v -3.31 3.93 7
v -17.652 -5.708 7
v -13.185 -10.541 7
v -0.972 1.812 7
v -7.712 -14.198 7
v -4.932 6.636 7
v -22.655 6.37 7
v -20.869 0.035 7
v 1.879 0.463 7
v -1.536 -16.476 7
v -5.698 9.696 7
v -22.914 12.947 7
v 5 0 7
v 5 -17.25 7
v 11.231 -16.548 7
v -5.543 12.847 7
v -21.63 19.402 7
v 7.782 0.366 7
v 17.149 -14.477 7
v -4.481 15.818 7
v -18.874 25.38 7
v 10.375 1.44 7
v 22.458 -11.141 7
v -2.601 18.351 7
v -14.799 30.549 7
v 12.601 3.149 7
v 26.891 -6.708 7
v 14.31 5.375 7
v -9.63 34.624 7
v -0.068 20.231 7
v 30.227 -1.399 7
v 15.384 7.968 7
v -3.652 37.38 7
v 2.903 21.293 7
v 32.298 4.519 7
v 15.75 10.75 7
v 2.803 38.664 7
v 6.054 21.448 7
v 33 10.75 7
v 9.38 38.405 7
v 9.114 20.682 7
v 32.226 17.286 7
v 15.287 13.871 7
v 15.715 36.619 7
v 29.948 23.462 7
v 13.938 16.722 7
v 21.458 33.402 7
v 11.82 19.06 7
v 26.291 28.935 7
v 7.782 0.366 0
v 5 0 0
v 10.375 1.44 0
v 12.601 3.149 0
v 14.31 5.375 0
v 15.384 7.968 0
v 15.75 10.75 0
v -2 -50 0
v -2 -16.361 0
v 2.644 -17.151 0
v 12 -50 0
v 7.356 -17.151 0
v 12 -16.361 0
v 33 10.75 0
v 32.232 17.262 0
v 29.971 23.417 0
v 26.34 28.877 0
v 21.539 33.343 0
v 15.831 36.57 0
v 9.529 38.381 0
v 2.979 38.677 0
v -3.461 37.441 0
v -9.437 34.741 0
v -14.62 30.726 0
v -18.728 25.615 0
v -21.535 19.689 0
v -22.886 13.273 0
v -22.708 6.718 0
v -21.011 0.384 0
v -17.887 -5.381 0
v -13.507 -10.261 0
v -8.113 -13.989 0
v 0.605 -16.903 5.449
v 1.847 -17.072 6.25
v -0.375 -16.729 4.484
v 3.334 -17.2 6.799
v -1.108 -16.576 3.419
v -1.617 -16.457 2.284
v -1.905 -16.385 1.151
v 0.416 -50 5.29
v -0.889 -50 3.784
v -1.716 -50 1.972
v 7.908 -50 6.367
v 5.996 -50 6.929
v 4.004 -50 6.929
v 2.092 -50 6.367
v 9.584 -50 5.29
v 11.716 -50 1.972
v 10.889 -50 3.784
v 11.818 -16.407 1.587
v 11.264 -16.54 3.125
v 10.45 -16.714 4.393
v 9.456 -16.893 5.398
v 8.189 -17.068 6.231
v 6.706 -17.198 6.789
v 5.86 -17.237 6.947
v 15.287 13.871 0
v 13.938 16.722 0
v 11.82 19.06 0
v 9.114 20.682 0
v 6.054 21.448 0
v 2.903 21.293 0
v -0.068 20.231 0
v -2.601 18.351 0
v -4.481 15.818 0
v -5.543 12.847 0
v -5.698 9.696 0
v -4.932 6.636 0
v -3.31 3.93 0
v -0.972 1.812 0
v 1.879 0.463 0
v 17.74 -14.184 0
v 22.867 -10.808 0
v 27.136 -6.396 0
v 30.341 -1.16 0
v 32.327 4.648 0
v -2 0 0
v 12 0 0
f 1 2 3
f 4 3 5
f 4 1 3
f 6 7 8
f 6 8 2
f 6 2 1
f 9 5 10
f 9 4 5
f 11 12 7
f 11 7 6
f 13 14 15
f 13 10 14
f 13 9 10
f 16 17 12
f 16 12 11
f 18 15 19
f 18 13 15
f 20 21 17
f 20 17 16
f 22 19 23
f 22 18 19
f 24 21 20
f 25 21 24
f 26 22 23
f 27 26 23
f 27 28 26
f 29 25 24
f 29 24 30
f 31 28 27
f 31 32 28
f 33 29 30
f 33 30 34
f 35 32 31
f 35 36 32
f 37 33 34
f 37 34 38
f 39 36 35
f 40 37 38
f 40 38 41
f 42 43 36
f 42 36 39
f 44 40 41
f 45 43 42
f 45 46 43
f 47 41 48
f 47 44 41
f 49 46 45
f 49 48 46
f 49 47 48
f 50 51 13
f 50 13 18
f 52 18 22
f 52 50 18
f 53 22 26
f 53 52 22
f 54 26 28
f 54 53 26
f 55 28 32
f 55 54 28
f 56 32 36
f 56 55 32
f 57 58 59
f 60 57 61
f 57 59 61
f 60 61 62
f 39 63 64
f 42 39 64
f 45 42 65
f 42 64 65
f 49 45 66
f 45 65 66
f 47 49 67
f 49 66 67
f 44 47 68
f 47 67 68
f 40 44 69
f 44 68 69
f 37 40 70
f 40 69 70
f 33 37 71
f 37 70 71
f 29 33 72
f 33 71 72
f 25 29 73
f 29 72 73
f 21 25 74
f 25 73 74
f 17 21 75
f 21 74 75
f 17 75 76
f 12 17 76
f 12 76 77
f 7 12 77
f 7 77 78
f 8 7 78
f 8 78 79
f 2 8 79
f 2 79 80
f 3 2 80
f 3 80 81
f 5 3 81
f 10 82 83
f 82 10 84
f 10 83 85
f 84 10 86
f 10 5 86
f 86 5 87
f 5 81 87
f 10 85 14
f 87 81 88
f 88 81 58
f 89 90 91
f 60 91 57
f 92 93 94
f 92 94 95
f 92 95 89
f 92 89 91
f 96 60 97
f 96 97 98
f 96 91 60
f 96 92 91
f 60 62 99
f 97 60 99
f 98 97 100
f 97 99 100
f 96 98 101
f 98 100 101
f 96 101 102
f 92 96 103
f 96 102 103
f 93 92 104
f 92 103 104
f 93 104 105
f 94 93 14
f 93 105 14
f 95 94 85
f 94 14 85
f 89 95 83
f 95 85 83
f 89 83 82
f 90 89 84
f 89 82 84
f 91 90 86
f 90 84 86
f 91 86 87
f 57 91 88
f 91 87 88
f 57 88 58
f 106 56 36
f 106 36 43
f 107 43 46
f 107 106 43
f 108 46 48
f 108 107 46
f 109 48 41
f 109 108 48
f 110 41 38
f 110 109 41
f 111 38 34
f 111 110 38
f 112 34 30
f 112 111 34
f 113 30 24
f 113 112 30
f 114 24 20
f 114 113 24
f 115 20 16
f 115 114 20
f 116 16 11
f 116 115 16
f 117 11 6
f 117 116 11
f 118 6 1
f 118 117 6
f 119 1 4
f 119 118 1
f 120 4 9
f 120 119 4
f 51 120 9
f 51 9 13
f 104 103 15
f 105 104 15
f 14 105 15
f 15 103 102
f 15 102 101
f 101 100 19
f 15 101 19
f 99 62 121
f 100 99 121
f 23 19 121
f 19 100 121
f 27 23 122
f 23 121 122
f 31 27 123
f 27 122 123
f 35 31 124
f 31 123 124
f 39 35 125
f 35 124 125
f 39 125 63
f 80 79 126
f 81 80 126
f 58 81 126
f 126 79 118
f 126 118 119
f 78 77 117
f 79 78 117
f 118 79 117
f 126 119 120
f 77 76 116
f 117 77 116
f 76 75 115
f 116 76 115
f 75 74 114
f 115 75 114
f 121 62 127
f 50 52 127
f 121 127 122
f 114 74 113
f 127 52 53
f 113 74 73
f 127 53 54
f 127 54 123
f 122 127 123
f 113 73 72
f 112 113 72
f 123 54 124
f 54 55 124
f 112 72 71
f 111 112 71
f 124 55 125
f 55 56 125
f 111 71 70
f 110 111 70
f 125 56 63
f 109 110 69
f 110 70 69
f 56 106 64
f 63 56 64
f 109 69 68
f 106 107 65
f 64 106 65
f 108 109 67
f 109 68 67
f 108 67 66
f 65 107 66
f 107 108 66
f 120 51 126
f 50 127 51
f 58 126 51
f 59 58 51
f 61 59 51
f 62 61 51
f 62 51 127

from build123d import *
from build123d import SkipClean  # not in build123d's __all__

# Parameters (mm, degrees)
F1_DEPTH = 50
F2_R     = 28
F2_R_2   = 10.75
F3_DEPTH = 7


with BuildPart() as f1:
    # F0 (on Front) → F1 (new body)
    with BuildSketch(Plane.XZ):
        with BuildLine():
            Line((-2, 0), (0, 0))
            Line((0, 0), (10, 0))
            Line((10, 0), (12, 0))
            ThreePointArc((12, 0), (5, 7), (-2, 0))
        make_face()
    extrude(amount=F1_DEPTH)

    # F2 (on Top) → F3 (join)
    with BuildSketch(Plane.XY):
        with Locations((5, 10.75)):
            Circle(F2_R)
        with Locations((5, 10.75)):
            Circle(F2_R_2, mode=Mode.SUBTRACT)
    with SkipClean():  # cleaning this boolean's faces spoils the solid; the shape is the same uncleaned
        extrude(amount=F3_DEPTH)


solid = f1.part
